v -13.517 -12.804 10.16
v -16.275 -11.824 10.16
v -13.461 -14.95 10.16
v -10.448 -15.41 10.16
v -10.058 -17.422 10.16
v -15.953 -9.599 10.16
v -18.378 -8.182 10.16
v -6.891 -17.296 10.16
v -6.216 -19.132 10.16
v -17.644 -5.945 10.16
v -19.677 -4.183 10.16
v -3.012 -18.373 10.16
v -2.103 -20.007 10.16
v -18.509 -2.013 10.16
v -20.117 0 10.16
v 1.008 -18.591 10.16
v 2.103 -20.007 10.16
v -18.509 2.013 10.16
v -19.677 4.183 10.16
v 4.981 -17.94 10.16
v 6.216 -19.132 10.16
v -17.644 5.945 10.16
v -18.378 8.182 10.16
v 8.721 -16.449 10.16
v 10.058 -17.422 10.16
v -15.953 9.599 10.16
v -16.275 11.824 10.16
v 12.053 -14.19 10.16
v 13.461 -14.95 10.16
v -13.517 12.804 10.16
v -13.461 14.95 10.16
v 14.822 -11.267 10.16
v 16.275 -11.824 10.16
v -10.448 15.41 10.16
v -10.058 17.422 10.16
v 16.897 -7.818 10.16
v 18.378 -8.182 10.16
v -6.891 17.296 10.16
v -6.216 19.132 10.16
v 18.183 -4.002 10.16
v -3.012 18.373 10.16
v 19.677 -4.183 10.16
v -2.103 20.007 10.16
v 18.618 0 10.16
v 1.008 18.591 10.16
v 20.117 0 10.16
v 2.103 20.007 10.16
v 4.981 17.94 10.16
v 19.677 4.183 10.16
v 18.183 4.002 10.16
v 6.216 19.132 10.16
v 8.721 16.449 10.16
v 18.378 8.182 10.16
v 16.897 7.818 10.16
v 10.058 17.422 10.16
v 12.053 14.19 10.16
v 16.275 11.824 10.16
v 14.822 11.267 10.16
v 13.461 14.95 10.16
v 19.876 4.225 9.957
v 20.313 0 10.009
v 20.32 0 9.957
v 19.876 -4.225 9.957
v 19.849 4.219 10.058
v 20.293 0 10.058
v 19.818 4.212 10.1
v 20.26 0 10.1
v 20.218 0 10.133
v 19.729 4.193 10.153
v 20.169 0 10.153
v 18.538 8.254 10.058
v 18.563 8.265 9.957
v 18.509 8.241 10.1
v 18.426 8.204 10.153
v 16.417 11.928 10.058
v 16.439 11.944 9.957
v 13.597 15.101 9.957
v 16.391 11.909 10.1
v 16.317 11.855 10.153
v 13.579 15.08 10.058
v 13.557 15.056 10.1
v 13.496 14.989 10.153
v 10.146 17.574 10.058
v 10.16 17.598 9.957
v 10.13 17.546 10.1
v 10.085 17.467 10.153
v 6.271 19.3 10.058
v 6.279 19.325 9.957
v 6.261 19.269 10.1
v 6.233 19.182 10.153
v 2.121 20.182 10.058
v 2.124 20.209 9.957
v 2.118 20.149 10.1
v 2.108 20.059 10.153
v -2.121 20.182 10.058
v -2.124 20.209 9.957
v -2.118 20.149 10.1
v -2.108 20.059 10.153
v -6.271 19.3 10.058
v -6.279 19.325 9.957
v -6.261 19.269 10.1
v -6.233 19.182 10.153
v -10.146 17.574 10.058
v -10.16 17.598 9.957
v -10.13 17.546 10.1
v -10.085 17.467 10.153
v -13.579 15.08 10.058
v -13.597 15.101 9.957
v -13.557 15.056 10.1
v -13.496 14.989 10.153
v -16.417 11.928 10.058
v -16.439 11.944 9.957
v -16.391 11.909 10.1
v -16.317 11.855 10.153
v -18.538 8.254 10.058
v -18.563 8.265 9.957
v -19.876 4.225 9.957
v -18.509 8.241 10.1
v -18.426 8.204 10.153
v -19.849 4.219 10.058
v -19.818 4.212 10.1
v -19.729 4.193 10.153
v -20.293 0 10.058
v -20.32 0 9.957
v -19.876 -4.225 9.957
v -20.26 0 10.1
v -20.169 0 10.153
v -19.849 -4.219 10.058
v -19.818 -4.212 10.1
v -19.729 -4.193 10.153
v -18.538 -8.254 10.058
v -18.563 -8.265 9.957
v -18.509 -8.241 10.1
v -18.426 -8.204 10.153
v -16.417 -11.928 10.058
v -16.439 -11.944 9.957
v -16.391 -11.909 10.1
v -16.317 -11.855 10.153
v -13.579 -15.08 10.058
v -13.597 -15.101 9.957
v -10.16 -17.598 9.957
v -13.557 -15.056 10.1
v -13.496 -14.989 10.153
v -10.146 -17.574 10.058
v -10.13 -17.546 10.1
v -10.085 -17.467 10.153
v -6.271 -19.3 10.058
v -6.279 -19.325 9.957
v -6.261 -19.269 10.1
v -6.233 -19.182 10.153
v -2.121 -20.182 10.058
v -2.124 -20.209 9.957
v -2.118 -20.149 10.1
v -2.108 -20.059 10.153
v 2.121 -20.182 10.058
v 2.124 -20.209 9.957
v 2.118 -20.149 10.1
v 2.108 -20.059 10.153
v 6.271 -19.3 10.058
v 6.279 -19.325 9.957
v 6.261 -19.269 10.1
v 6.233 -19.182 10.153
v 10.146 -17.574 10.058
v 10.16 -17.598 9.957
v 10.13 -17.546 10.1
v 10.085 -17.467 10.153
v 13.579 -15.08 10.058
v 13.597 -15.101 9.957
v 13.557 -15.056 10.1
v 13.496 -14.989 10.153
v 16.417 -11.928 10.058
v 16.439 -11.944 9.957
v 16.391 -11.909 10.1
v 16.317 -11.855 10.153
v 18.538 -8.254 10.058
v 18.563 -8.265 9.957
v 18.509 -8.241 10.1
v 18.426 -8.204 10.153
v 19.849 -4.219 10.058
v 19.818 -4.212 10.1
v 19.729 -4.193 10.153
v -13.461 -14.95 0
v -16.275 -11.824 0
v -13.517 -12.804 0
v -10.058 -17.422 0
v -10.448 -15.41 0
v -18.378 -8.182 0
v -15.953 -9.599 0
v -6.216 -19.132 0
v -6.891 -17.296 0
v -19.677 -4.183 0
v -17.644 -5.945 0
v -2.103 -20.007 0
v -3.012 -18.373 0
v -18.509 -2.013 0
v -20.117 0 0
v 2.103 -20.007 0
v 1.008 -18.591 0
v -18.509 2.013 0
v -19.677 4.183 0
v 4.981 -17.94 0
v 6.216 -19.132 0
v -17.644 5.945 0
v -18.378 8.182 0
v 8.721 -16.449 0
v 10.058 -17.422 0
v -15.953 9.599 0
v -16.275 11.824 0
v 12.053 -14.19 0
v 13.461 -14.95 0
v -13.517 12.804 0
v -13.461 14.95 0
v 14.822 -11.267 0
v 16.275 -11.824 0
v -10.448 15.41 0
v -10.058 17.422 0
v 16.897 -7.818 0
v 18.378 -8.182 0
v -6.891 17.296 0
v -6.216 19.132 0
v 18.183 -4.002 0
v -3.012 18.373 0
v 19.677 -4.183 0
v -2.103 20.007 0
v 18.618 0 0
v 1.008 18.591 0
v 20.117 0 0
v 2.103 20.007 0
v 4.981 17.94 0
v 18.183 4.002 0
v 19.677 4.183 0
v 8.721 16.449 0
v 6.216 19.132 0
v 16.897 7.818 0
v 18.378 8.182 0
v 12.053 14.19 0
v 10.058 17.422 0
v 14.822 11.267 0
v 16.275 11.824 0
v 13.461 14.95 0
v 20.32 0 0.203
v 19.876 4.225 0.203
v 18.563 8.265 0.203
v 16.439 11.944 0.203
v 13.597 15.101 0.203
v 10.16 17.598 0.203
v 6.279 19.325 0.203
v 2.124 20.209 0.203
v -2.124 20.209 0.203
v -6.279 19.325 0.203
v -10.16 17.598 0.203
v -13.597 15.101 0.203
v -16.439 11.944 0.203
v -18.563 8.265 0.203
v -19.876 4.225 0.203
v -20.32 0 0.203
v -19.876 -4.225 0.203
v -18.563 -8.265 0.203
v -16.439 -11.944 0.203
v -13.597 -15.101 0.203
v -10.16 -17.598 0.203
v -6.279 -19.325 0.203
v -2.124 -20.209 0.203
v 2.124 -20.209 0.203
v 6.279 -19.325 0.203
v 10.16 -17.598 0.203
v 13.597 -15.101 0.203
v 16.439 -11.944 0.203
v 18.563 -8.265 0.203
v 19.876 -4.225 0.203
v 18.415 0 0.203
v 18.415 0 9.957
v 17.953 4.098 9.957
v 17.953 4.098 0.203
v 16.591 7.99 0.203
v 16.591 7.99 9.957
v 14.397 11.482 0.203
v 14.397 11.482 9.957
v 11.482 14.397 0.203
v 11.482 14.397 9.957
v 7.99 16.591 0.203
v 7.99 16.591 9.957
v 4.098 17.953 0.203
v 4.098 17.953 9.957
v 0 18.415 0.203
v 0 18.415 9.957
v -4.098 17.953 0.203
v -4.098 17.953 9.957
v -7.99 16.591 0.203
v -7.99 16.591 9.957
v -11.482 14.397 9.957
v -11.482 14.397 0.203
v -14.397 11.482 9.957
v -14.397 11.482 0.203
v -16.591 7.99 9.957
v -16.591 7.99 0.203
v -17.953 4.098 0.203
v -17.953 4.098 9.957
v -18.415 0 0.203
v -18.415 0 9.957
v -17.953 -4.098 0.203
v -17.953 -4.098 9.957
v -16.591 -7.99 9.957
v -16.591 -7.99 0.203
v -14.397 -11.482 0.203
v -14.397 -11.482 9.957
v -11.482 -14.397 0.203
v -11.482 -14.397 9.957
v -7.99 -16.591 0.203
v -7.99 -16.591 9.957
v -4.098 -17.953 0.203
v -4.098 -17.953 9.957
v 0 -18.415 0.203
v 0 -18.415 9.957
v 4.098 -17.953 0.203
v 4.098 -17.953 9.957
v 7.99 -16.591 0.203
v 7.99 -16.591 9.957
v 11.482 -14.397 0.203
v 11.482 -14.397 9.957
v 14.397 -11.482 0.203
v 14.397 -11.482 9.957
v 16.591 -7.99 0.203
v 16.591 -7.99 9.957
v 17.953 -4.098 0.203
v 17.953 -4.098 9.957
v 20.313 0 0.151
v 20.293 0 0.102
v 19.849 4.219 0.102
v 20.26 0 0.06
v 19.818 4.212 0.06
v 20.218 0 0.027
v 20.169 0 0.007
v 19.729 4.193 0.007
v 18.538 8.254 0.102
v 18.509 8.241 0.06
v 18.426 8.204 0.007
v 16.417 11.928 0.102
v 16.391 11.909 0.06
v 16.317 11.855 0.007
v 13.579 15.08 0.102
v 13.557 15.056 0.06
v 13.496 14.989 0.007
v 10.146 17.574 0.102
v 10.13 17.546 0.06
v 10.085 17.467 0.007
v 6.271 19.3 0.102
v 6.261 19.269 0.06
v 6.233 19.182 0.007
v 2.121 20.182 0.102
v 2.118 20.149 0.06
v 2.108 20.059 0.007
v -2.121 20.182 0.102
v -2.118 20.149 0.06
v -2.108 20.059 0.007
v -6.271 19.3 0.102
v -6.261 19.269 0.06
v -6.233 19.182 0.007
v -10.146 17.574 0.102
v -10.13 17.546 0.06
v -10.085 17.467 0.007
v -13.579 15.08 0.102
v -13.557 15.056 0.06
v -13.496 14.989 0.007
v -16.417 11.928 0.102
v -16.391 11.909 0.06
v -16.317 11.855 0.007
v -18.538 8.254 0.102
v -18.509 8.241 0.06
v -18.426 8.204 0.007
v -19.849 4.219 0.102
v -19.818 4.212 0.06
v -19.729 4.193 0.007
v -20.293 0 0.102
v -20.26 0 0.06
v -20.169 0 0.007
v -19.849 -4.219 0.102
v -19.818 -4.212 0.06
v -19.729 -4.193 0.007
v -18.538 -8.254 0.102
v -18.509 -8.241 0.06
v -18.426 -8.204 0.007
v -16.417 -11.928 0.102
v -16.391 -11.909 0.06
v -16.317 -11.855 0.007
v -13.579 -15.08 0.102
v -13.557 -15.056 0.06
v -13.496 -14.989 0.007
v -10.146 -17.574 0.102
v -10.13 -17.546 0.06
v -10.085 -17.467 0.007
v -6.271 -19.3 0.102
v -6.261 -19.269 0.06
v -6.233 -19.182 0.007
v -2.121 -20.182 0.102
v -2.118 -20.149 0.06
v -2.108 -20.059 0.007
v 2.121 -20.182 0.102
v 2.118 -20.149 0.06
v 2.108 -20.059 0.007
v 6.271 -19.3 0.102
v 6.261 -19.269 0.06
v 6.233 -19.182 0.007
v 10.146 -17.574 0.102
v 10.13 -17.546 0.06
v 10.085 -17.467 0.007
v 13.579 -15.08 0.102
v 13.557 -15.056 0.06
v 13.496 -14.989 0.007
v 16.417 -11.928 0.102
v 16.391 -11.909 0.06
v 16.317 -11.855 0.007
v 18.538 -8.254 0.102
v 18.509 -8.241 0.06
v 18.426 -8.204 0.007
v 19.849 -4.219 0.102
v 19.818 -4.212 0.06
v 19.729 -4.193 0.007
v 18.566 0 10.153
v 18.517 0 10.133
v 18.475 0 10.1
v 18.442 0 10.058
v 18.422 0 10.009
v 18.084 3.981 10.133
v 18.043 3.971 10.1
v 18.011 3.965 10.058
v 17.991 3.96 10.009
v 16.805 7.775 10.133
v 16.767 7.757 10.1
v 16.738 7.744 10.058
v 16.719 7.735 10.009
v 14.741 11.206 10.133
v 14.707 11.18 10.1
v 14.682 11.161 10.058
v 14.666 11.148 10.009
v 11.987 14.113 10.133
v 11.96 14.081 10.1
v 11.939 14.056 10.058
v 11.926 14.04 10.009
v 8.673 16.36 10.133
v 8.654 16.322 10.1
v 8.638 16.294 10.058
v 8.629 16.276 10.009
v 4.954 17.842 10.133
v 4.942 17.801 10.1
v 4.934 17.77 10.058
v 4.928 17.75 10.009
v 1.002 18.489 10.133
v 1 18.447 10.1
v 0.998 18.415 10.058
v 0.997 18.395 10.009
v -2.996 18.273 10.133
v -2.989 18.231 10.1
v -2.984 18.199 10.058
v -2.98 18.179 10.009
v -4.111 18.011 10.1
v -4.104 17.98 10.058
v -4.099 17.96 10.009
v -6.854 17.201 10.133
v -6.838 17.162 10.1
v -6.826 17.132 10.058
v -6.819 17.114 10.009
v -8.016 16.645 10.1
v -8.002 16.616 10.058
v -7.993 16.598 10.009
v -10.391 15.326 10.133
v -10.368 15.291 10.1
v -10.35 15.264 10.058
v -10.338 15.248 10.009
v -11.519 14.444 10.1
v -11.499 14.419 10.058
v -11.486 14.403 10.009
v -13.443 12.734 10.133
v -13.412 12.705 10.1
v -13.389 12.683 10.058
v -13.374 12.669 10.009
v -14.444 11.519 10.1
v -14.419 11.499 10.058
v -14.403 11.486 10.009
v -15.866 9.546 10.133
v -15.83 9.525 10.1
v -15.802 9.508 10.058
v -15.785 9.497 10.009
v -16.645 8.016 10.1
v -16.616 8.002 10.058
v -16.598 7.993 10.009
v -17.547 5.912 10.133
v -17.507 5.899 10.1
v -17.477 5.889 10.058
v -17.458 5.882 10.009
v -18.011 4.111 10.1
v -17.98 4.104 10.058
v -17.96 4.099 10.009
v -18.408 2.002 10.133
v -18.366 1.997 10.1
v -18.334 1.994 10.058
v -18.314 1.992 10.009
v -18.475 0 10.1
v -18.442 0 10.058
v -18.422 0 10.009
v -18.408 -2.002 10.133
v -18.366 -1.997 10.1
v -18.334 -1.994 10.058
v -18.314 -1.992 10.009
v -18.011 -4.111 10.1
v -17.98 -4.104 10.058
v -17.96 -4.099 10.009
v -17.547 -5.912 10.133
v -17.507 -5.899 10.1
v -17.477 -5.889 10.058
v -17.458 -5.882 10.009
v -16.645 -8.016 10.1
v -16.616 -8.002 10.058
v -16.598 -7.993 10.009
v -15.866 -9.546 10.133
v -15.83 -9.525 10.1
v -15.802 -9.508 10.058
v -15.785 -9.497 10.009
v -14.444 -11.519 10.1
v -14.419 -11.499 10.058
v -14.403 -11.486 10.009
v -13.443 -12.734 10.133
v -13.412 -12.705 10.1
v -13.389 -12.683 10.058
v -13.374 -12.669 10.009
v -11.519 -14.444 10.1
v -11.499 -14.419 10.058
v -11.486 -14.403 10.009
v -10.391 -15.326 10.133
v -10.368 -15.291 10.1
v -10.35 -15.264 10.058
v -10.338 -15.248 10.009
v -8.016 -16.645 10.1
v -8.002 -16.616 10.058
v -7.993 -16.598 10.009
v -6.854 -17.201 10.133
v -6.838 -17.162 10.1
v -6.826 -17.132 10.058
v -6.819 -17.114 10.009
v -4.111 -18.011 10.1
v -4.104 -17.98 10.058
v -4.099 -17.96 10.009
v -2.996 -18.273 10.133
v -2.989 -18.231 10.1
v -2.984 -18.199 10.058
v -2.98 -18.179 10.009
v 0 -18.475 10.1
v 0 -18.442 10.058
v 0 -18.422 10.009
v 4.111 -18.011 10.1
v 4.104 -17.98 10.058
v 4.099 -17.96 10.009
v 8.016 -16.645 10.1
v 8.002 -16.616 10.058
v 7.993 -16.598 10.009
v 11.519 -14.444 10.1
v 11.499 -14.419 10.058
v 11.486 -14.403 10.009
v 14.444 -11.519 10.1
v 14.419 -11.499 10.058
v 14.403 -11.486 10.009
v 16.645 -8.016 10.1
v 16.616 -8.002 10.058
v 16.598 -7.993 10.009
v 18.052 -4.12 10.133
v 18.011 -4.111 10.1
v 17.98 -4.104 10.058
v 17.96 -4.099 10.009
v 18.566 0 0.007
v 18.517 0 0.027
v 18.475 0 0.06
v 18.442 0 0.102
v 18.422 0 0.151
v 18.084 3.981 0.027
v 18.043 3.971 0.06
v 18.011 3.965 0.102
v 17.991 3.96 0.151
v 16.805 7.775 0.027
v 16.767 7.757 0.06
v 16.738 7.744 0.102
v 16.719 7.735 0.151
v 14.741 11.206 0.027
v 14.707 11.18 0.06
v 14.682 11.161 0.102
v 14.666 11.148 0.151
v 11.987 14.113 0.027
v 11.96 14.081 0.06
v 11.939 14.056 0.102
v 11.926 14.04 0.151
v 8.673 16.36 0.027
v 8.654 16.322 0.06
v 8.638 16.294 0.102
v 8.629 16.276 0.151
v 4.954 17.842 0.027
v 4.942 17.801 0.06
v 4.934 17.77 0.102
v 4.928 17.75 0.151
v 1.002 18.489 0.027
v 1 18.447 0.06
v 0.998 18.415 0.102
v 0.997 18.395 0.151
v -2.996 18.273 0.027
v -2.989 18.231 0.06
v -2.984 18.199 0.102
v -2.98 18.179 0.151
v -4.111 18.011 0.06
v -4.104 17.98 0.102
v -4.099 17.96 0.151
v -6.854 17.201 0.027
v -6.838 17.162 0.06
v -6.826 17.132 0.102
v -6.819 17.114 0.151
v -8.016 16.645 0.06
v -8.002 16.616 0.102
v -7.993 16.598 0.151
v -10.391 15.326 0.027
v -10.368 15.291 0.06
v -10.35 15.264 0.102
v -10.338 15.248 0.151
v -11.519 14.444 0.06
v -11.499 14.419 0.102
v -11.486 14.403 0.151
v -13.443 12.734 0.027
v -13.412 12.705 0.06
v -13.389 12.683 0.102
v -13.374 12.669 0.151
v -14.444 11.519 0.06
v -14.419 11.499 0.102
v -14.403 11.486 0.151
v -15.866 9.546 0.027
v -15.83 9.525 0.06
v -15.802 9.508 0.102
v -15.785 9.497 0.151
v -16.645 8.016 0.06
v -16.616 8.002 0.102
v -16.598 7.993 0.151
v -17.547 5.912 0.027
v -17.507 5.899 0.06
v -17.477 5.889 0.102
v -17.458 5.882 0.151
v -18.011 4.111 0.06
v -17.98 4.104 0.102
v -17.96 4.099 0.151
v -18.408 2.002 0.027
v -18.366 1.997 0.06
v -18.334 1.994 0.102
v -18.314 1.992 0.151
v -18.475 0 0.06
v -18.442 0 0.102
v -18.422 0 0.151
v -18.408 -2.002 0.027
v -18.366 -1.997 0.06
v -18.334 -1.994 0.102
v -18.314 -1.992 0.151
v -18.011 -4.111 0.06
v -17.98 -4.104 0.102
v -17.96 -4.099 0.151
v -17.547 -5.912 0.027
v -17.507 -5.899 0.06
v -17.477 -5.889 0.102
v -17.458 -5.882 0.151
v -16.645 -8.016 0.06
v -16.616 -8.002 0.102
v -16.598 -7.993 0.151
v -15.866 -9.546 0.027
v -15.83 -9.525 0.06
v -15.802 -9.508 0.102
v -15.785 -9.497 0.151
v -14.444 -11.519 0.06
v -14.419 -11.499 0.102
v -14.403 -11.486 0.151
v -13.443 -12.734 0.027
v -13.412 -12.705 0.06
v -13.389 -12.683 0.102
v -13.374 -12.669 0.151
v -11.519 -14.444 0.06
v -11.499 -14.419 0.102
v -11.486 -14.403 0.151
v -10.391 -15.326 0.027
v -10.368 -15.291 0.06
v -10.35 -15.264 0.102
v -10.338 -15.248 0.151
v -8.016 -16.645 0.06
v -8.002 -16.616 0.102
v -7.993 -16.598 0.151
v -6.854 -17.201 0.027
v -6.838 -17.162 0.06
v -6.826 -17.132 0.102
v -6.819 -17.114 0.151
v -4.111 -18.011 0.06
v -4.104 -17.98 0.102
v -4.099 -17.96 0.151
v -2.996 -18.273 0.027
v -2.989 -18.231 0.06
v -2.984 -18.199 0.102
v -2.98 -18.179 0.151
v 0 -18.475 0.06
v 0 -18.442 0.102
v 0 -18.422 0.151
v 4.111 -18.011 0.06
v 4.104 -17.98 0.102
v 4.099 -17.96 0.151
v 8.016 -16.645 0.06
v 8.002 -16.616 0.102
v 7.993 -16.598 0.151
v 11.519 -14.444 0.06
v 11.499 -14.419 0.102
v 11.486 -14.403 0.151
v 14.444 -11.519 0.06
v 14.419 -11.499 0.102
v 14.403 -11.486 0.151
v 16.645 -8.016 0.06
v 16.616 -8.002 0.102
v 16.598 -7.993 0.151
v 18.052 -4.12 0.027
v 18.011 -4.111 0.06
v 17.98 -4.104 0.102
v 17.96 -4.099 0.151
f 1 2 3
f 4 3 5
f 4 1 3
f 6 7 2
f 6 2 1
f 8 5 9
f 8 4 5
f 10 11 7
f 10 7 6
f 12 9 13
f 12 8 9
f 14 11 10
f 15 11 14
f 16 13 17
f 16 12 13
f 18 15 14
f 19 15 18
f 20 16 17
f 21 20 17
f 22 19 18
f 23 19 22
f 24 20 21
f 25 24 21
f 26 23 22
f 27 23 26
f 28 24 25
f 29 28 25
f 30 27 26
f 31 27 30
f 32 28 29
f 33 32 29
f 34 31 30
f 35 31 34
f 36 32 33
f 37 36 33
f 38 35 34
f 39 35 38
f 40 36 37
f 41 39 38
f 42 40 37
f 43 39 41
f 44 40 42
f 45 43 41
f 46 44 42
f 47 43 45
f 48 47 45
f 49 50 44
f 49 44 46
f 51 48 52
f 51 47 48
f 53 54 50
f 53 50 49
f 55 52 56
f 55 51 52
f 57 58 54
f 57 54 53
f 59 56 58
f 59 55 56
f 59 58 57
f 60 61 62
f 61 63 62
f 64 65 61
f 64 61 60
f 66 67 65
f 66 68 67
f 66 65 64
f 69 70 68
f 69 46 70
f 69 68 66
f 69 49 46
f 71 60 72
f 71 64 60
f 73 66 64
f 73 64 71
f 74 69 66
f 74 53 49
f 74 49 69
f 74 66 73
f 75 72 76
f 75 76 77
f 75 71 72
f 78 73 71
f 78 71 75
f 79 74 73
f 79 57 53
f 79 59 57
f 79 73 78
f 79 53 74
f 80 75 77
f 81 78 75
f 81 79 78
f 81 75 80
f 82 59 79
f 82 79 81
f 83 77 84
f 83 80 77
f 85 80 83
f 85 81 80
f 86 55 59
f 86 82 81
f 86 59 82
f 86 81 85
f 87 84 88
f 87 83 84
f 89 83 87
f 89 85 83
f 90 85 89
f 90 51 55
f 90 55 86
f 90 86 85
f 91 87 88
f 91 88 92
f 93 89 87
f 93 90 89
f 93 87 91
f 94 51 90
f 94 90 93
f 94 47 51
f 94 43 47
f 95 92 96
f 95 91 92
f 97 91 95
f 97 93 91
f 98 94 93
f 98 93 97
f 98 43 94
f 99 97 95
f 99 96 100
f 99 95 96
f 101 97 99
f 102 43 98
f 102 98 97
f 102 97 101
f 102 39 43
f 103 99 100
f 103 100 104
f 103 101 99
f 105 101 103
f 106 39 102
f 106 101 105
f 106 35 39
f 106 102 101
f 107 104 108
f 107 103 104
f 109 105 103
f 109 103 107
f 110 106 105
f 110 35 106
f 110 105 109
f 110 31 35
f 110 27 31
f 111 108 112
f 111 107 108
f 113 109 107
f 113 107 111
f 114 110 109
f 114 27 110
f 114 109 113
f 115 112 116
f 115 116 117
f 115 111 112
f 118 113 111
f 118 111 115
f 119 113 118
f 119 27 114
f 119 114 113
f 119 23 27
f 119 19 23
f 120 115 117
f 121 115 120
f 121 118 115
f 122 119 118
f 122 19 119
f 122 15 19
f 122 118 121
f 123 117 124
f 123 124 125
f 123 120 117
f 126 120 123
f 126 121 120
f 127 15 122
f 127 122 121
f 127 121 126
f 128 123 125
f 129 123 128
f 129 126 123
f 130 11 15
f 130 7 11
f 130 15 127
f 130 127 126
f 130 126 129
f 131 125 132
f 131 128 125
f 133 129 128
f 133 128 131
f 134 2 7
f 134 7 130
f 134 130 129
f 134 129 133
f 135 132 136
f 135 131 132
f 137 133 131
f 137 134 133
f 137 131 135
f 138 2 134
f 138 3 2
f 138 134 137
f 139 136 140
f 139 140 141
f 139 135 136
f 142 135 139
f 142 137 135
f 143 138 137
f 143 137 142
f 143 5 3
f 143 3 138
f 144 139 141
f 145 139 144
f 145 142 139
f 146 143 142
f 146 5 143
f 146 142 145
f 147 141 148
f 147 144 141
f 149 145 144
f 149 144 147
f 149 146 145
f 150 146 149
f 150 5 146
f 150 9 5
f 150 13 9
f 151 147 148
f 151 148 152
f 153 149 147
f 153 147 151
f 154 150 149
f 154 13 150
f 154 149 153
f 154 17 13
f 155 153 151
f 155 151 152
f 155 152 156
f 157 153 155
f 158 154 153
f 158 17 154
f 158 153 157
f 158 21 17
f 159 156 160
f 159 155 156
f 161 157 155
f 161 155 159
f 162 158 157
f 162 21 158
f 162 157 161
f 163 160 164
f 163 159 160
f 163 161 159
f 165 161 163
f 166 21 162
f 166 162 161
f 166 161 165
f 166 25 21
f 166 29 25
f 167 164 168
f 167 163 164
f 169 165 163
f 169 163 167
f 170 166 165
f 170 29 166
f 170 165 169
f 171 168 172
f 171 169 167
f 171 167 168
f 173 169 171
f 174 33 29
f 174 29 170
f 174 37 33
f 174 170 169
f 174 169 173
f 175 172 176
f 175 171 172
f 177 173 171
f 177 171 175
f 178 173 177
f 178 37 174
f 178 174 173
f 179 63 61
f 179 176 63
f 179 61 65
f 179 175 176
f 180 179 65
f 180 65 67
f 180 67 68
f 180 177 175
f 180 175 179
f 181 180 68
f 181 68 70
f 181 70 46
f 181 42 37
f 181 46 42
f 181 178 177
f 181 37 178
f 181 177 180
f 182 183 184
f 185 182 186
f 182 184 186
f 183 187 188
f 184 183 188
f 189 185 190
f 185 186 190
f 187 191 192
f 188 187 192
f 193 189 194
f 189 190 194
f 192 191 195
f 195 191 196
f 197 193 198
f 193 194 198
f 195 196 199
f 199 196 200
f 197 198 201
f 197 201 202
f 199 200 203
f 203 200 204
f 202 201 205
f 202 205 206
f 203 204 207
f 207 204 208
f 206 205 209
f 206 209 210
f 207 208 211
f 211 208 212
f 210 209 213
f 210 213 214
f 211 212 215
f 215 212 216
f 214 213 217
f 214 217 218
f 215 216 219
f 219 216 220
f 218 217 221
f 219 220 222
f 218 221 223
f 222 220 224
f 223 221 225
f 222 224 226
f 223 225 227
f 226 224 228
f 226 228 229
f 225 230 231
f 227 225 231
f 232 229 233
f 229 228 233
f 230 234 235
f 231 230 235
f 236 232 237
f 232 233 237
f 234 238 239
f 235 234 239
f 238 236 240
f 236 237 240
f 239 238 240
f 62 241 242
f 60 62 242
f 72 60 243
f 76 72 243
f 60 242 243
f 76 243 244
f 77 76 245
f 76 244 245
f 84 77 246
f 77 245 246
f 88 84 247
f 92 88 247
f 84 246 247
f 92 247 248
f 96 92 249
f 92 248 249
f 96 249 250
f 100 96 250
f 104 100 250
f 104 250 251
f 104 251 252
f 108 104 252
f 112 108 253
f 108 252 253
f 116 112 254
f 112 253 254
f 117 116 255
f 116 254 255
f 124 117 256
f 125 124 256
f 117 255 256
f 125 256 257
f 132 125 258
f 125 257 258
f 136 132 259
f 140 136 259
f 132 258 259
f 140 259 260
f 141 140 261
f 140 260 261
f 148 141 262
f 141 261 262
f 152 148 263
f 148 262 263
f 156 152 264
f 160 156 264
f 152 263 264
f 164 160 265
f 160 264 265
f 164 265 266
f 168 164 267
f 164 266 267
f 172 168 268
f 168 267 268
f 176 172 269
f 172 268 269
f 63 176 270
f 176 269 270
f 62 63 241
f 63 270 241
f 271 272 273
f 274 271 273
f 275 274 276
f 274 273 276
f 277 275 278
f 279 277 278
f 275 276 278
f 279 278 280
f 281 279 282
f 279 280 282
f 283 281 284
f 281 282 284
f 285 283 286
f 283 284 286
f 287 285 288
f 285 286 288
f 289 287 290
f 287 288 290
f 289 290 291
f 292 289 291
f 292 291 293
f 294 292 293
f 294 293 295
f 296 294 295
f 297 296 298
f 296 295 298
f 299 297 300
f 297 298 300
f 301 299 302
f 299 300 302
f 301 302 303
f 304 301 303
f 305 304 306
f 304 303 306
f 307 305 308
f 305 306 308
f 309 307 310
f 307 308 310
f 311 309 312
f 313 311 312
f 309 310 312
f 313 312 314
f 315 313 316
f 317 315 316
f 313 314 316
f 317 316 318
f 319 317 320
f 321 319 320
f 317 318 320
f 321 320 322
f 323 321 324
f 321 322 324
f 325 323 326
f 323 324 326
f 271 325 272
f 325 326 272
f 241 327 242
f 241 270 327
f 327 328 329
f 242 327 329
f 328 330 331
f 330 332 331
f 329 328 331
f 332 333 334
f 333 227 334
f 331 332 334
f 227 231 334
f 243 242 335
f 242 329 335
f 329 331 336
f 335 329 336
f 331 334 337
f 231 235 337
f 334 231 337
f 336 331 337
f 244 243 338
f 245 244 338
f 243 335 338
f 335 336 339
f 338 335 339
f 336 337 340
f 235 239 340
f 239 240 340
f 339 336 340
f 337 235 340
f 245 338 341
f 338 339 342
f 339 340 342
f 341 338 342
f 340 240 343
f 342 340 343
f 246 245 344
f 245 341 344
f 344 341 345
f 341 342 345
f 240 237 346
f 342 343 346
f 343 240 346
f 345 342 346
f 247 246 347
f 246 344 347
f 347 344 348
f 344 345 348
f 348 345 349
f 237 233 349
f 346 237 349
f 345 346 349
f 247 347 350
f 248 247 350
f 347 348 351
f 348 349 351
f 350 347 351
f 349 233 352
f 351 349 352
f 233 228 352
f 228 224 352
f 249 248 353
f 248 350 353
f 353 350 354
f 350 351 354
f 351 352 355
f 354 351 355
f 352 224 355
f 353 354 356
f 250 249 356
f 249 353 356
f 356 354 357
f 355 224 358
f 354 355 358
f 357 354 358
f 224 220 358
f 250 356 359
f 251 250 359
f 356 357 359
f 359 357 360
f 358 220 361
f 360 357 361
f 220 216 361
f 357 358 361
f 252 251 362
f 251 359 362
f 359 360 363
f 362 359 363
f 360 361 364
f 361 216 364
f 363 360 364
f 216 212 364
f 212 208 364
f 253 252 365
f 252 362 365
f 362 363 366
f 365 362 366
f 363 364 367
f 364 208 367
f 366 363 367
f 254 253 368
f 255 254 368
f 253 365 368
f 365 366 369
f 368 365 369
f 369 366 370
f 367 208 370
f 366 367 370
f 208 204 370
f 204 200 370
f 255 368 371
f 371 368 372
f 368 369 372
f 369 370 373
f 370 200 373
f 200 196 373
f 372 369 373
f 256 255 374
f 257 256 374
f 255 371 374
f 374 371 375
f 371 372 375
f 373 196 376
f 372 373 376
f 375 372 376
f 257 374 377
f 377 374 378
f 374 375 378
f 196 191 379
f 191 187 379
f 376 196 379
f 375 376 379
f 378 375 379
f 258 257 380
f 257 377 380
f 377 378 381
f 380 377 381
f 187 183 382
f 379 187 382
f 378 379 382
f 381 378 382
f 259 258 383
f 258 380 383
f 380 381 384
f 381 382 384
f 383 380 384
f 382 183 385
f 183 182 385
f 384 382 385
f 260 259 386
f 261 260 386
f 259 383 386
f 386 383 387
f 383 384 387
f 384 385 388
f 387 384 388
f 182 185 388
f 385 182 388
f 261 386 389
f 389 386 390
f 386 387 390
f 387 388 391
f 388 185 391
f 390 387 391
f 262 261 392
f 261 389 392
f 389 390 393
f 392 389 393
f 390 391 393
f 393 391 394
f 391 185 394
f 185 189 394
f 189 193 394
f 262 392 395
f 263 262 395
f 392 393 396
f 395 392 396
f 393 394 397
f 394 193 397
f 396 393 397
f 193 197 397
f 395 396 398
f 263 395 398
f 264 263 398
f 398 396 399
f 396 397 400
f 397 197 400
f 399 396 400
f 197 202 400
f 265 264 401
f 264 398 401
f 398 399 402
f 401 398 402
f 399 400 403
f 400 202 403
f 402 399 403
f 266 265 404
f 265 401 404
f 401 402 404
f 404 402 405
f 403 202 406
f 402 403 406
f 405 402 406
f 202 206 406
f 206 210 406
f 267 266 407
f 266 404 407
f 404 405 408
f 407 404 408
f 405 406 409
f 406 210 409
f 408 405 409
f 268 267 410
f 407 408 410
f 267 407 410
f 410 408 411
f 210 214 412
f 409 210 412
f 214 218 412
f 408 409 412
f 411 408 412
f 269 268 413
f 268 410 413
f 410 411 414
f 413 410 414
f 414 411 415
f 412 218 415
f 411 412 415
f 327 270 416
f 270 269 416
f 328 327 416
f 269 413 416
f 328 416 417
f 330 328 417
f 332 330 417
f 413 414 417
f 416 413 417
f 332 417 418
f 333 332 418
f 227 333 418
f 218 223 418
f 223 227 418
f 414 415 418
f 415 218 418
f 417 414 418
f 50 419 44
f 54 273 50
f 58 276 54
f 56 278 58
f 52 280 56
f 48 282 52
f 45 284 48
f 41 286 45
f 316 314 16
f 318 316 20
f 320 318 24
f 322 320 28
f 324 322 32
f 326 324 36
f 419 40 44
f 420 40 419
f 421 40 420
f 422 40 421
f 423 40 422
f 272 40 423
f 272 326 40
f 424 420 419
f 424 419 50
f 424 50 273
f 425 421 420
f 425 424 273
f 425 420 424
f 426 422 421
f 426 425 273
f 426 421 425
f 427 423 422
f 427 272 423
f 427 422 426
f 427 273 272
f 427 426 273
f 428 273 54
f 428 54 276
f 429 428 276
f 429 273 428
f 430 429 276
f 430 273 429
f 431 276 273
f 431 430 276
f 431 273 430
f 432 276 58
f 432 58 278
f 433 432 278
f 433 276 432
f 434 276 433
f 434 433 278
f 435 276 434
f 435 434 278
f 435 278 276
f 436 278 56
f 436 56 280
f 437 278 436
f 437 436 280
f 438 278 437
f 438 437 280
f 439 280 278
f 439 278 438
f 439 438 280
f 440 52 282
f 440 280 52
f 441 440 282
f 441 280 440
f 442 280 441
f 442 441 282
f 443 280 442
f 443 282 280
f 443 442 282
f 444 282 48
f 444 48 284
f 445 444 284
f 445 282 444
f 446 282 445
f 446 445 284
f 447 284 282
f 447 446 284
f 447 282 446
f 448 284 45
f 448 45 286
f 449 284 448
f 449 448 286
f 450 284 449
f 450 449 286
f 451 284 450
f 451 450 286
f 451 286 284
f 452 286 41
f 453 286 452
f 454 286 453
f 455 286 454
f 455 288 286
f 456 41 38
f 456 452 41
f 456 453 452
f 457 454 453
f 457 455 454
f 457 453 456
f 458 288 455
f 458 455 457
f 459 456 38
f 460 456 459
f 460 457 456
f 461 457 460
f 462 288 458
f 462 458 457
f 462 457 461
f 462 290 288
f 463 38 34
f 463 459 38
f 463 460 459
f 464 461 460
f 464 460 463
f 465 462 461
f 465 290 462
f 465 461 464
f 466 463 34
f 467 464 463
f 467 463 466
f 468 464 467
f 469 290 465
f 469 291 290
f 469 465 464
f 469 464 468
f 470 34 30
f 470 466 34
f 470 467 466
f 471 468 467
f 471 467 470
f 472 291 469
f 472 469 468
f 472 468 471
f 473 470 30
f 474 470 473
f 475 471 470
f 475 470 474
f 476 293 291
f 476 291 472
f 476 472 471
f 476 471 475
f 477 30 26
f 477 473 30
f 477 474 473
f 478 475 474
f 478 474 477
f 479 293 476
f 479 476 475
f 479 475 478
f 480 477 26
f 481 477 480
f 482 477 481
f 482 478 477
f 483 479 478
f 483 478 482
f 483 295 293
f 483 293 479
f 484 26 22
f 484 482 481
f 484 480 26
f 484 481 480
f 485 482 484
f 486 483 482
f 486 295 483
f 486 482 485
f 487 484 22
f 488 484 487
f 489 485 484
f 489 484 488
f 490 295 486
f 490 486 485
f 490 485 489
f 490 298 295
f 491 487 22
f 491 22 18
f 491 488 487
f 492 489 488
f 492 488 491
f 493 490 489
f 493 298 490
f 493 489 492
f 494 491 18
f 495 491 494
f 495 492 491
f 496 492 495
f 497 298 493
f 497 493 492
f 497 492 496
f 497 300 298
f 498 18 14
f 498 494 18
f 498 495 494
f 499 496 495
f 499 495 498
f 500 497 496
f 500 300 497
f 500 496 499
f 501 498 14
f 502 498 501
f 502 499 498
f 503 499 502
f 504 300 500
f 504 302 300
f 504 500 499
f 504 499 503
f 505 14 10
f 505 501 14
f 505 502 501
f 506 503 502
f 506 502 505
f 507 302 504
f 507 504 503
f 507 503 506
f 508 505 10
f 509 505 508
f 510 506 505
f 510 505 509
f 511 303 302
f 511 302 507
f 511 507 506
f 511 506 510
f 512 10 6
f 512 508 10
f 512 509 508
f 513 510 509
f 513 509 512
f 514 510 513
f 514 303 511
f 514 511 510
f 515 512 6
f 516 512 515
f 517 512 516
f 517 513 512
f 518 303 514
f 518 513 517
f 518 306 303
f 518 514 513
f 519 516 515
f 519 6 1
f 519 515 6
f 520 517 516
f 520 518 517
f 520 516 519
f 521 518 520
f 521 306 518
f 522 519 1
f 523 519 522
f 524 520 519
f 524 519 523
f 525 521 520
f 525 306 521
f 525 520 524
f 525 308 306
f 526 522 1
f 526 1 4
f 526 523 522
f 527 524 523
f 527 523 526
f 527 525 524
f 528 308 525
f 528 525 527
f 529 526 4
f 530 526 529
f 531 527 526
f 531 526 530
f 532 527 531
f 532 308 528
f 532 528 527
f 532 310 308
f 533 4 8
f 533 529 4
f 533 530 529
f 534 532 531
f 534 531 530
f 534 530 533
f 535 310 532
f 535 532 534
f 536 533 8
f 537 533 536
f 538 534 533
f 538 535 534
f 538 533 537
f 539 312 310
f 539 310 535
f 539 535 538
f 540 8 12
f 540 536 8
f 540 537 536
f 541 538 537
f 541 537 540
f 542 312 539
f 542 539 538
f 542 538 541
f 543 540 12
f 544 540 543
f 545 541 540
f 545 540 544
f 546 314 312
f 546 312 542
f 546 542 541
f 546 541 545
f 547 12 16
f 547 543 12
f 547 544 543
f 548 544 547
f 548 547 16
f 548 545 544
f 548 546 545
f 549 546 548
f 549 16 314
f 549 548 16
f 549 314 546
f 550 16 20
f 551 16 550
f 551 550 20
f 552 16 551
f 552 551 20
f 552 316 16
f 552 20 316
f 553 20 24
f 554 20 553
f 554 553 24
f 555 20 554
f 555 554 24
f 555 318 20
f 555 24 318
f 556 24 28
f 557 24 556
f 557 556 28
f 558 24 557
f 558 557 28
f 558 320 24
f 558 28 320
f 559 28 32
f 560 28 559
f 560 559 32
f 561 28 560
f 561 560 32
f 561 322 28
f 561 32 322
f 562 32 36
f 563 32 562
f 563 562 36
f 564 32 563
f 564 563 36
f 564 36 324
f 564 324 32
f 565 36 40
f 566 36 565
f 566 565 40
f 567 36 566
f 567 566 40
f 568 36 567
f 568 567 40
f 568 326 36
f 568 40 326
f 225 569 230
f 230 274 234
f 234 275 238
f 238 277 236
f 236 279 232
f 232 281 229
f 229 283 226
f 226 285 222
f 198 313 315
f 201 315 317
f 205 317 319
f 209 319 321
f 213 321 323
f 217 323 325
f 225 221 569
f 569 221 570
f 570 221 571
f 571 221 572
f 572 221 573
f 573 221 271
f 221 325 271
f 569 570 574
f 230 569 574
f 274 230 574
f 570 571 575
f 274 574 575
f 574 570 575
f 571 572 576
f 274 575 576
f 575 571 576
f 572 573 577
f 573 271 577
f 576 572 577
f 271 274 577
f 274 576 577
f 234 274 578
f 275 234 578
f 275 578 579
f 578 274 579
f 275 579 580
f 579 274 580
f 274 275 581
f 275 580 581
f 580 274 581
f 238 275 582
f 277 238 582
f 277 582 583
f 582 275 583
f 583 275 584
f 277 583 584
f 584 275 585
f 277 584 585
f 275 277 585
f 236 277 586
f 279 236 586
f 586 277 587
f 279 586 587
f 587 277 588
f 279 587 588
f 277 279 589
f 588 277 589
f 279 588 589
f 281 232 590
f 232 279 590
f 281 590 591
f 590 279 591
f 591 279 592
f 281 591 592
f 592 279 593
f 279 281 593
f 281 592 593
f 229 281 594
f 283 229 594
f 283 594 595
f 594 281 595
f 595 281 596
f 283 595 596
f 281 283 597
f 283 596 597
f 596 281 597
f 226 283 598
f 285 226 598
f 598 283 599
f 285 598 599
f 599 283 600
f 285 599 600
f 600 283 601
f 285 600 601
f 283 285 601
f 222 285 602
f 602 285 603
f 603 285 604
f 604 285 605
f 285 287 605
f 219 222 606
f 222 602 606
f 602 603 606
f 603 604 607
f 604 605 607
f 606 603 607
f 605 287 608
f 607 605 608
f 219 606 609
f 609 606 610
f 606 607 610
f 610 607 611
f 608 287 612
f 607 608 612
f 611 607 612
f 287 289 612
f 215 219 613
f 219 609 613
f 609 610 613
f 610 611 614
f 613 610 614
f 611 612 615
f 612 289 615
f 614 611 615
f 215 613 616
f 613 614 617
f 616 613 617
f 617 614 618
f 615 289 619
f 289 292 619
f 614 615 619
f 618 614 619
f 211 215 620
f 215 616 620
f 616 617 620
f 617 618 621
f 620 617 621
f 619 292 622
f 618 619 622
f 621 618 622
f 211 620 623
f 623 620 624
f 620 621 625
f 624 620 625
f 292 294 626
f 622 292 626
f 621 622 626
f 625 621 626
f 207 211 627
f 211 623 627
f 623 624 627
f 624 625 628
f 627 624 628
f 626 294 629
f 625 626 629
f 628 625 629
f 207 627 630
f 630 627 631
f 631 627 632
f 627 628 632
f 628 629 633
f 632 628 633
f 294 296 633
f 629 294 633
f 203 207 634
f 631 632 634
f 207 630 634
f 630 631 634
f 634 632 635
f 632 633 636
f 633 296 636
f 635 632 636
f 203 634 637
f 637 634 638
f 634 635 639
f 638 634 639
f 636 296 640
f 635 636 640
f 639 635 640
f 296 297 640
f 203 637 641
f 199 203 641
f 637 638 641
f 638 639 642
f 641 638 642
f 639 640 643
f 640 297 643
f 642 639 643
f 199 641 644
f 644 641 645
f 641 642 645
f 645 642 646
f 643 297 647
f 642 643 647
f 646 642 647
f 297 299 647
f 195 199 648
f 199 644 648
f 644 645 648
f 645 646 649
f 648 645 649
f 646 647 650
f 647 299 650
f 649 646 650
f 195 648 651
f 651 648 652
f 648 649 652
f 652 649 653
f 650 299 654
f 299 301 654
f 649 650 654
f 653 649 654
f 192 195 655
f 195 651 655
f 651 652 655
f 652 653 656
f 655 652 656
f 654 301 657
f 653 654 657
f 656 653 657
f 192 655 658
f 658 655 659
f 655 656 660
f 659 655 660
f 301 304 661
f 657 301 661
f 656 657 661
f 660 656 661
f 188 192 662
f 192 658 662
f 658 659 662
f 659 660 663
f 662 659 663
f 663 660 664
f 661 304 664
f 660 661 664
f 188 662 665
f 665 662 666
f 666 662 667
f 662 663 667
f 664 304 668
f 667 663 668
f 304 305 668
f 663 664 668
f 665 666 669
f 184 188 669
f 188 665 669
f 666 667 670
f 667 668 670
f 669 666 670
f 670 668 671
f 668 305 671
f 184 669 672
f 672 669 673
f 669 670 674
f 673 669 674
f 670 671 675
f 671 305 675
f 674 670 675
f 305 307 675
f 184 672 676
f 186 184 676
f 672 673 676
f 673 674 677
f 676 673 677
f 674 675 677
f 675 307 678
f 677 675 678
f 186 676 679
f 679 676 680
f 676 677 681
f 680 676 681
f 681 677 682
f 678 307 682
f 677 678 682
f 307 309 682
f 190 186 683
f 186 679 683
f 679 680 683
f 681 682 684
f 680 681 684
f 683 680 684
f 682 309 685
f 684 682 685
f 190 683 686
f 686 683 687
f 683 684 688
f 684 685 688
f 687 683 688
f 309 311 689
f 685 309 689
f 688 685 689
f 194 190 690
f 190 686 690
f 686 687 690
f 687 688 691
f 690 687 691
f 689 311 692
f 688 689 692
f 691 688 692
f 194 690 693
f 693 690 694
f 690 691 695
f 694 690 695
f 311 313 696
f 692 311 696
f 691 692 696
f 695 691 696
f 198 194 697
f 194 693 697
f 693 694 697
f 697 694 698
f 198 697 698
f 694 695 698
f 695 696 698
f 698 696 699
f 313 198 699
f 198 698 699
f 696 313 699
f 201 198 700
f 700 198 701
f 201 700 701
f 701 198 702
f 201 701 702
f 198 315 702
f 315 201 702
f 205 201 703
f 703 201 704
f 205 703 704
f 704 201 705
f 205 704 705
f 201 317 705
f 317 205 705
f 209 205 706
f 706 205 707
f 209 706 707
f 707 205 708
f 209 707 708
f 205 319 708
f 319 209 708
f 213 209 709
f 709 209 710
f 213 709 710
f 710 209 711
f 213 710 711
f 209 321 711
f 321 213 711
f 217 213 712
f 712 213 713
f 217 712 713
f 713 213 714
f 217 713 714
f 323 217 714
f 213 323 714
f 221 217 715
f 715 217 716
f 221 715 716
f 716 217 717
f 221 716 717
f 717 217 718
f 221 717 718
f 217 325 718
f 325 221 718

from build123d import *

# Parameters (mm, degrees)
F0_R     = 20.32
F1_DEPTH = 10.16
F2_R     = 18.415
F3_DEPTH = 12.7
F4_R     = 0.2032


with BuildPart() as f1:
    # F0 (on Top) → F1 (new body)
    with BuildSketch(Plane.XY):
        Circle(F0_R)
    extrude(amount=F1_DEPTH)

    # F2 (on Top) → F3 (cut, symmetric)
    with BuildSketch(Plane.XY):
        Circle(F2_R)
    extrude(amount=F3_DEPTH, both=True, mode=Mode.SUBTRACT)

    # F4
    f4_edges = [f1.edges().sort_by_distance(p)[0] for p in [
        (-20.32, 0, 10.16),
        (-18.415, 0, 10.16),
        (-20.32, 0, 0),
        (-18.415, 0, 0),
    ]]
    fillet(f4_edges, radius=F4_R)


solid = f1.part
